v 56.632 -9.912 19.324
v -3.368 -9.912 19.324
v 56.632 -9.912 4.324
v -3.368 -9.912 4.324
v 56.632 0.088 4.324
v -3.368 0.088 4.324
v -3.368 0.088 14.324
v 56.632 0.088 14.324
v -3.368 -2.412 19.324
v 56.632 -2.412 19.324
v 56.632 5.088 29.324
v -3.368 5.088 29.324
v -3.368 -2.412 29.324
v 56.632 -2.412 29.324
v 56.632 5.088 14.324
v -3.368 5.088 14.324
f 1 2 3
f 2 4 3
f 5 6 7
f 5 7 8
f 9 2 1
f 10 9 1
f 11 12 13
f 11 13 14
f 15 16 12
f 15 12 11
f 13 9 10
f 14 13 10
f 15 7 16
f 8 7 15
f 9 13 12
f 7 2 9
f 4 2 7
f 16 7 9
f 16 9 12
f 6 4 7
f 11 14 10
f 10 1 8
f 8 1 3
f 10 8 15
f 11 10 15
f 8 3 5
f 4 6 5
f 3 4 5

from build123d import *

# Parameters (mm, degrees)
SKETCH_3_W      = 60
SKETCH_3_H      = 10
EXTRUDE_1_DEPTH = 10
SKETCH_4_W      = 60
SKETCH_4_H      = 10
EXTRUDE_2_DEPTH = 5
SKETCH_5_W      = 60
SKETCH_5_H      = 5
EXTRUDE_3_DEPTH = 5
SKETCH_6_W      = 60
SKETCH_6_H      = 7.5
EXTRUDE_4_DEPTH = 10


with BuildPart() as part:
    # 草图3 → 凸台-拉伸1 (new body)
    with BuildSketch(Plane.XZ.offset(-0.087836635)):
        with Locations((26.631510997, 9.323973154)):
            Rectangle(SKETCH_3_W, SKETCH_3_H)
    extrude(amount=EXTRUDE_1_DEPTH)

    # 草图4 → 凸台-拉伸2 (add)
    with BuildSketch(Plane.XY.offset(14.323973154)):
        with Locations((26.631510997, -4.912163365)):
            Rectangle(SKETCH_4_W, SKETCH_4_H)
    extrude(amount=EXTRUDE_2_DEPTH)

    # 草图5 → 凸台-拉伸3 (add)
    with BuildSketch(Plane(origin=(0, 0.087836635, 0), x_dir=(1, 0, 0), z_dir=(0, 1, 0))):
        with Locations((26.631510997, -16.823973154)):
            Rectangle(SKETCH_5_W, SKETCH_5_H)
    extrude(amount=EXTRUDE_3_DEPTH)

    # 草图6 → 凸台-拉伸4 (add)
    with BuildSketch(Plane.XY.offset(19.323973154)):
        with Locations((26.631510997, 1.337836635)):
            Rectangle(SKETCH_6_W, SKETCH_6_H)
    extrude(amount=EXTRUDE_4_DEPTH)


solid = part.part
